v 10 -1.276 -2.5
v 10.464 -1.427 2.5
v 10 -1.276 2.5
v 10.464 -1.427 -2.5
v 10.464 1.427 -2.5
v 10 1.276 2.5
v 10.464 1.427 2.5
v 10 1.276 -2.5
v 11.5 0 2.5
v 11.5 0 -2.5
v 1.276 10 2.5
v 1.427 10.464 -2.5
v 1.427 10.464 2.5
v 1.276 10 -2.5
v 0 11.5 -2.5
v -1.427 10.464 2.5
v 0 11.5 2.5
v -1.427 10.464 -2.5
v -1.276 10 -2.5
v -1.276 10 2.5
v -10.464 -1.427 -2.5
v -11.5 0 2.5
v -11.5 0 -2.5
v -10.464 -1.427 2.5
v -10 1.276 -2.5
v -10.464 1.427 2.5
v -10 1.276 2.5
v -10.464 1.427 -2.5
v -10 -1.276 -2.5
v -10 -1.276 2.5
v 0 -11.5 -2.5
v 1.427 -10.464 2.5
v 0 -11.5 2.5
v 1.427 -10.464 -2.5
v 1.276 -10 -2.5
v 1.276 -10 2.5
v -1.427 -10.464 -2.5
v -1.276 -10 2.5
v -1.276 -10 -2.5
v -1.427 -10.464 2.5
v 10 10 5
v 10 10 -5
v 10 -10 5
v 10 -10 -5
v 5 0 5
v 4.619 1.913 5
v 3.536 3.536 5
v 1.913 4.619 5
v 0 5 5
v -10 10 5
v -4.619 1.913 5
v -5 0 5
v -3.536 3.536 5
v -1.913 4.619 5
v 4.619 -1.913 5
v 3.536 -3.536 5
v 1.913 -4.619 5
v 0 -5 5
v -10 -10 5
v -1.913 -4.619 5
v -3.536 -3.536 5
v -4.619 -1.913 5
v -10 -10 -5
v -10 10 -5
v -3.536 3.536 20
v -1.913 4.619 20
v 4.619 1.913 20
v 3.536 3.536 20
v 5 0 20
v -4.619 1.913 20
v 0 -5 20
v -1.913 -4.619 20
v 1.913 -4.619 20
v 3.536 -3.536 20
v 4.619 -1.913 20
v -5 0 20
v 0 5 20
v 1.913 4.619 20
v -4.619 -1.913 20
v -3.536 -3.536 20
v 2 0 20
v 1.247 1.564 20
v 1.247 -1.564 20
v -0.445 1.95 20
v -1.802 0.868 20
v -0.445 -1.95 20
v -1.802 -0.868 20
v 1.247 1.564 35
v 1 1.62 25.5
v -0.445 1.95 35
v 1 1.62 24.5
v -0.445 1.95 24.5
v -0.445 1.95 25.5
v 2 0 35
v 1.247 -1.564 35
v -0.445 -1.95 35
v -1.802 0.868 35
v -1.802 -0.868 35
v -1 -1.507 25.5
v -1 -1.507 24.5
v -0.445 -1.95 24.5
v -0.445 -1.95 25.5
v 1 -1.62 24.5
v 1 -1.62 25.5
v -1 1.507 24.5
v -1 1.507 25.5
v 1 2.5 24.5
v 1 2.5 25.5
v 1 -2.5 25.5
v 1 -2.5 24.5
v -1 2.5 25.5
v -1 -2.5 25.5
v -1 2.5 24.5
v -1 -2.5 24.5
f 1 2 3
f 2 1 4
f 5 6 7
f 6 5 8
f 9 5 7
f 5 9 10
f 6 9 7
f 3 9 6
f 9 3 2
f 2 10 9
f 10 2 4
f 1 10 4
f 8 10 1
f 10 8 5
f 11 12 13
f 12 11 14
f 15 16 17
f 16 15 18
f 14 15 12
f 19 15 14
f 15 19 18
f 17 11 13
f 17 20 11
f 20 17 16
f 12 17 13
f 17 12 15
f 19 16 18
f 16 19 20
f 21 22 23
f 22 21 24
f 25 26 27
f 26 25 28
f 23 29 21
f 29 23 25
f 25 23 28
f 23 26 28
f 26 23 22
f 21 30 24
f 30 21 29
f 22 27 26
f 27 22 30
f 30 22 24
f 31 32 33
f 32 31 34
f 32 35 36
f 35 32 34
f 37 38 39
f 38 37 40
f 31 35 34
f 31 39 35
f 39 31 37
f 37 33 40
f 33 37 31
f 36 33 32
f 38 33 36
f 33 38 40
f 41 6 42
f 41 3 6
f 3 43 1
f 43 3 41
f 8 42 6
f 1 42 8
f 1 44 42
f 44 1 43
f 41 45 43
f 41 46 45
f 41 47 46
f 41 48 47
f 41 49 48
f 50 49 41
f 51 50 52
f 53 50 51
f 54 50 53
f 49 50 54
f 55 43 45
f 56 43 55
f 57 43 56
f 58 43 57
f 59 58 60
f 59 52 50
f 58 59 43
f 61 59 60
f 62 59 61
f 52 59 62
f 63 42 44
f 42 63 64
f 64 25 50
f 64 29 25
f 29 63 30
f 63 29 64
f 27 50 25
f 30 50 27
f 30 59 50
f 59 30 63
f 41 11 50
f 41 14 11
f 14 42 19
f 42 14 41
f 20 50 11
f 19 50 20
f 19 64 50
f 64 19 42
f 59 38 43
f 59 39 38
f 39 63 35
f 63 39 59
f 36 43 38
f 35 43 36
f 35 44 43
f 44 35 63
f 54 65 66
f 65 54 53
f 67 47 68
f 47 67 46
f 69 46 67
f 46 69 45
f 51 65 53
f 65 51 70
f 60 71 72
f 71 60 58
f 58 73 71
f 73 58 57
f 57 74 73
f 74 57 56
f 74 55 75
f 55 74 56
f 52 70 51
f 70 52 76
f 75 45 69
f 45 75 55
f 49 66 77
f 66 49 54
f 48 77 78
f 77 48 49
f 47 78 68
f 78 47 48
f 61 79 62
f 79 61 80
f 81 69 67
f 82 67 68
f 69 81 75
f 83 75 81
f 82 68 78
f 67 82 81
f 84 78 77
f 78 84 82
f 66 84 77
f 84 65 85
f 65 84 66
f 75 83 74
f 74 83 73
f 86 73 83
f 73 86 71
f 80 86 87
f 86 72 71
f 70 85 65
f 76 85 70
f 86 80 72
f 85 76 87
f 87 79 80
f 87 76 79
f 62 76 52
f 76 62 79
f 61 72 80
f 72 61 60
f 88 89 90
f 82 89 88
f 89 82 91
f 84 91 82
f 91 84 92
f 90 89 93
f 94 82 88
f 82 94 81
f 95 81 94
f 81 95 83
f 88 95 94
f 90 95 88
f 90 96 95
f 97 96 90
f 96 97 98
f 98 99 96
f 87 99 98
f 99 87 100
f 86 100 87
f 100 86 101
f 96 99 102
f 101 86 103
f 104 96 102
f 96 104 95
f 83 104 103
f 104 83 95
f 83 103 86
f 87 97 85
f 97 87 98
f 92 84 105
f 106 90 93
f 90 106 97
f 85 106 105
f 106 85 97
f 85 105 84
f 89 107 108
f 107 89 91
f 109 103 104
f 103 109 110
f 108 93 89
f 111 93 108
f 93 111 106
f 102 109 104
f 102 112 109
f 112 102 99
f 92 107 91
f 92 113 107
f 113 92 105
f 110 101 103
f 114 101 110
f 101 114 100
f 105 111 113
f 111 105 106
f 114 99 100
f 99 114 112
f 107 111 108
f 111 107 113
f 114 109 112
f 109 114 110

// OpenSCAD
module gear_motor_assembly() {
    gearbox_body();
    motor_can();
    output_shaft();
    shaft_boss();
    mounting_screw_bosses();
    mounting_screw_holes();
    electrical_tags();
}

module gearbox_body() {
    // Define the gearbox body dimensions and shape
    translate([0, 0, 0])
    cube([20, 20, 10], center = true);
}

module motor_can() {
    // Define the motor can dimensions and shape
    translate([0, 0, 10])
    cylinder(h = 20, r = 5, center = true);
}

module output_shaft() {
    // Define the output shaft dimensions and shape
    translate([0, 0, 20])
    cylinder(h = 30, r = 2, center = true);
}

module shaft_boss() {
    // Define the shaft boss dimensions and shape
    translate([0, 0, 15])
    cylinder(h = 5, r = 3, center = true);
}

module mounting_screw_bosses() {
    // Define the mounting screw bosses
    for (i = [0:3]) {
        rotate([0, 0, i * 90])
        translate([10, 0, 0])
        cylinder(h = 5, r = 1.5, center = true);
    }
}

module mounting_screw_holes() {
    // Define the mounting screw holes
    for (i = [0:3]) {
        rotate([0, 0, i * 90])
        translate([10, 0, 0])
        cylinder(h = 5, r = 1, center = true);
    }
}

module electrical_tags() {
    // Define the electrical tags
    translate([0, 0, 25])
    cube([2, 5, 1], center = true);
}

module gear_motor() {
    gear_motor_assembly();
}

gear_motor();
